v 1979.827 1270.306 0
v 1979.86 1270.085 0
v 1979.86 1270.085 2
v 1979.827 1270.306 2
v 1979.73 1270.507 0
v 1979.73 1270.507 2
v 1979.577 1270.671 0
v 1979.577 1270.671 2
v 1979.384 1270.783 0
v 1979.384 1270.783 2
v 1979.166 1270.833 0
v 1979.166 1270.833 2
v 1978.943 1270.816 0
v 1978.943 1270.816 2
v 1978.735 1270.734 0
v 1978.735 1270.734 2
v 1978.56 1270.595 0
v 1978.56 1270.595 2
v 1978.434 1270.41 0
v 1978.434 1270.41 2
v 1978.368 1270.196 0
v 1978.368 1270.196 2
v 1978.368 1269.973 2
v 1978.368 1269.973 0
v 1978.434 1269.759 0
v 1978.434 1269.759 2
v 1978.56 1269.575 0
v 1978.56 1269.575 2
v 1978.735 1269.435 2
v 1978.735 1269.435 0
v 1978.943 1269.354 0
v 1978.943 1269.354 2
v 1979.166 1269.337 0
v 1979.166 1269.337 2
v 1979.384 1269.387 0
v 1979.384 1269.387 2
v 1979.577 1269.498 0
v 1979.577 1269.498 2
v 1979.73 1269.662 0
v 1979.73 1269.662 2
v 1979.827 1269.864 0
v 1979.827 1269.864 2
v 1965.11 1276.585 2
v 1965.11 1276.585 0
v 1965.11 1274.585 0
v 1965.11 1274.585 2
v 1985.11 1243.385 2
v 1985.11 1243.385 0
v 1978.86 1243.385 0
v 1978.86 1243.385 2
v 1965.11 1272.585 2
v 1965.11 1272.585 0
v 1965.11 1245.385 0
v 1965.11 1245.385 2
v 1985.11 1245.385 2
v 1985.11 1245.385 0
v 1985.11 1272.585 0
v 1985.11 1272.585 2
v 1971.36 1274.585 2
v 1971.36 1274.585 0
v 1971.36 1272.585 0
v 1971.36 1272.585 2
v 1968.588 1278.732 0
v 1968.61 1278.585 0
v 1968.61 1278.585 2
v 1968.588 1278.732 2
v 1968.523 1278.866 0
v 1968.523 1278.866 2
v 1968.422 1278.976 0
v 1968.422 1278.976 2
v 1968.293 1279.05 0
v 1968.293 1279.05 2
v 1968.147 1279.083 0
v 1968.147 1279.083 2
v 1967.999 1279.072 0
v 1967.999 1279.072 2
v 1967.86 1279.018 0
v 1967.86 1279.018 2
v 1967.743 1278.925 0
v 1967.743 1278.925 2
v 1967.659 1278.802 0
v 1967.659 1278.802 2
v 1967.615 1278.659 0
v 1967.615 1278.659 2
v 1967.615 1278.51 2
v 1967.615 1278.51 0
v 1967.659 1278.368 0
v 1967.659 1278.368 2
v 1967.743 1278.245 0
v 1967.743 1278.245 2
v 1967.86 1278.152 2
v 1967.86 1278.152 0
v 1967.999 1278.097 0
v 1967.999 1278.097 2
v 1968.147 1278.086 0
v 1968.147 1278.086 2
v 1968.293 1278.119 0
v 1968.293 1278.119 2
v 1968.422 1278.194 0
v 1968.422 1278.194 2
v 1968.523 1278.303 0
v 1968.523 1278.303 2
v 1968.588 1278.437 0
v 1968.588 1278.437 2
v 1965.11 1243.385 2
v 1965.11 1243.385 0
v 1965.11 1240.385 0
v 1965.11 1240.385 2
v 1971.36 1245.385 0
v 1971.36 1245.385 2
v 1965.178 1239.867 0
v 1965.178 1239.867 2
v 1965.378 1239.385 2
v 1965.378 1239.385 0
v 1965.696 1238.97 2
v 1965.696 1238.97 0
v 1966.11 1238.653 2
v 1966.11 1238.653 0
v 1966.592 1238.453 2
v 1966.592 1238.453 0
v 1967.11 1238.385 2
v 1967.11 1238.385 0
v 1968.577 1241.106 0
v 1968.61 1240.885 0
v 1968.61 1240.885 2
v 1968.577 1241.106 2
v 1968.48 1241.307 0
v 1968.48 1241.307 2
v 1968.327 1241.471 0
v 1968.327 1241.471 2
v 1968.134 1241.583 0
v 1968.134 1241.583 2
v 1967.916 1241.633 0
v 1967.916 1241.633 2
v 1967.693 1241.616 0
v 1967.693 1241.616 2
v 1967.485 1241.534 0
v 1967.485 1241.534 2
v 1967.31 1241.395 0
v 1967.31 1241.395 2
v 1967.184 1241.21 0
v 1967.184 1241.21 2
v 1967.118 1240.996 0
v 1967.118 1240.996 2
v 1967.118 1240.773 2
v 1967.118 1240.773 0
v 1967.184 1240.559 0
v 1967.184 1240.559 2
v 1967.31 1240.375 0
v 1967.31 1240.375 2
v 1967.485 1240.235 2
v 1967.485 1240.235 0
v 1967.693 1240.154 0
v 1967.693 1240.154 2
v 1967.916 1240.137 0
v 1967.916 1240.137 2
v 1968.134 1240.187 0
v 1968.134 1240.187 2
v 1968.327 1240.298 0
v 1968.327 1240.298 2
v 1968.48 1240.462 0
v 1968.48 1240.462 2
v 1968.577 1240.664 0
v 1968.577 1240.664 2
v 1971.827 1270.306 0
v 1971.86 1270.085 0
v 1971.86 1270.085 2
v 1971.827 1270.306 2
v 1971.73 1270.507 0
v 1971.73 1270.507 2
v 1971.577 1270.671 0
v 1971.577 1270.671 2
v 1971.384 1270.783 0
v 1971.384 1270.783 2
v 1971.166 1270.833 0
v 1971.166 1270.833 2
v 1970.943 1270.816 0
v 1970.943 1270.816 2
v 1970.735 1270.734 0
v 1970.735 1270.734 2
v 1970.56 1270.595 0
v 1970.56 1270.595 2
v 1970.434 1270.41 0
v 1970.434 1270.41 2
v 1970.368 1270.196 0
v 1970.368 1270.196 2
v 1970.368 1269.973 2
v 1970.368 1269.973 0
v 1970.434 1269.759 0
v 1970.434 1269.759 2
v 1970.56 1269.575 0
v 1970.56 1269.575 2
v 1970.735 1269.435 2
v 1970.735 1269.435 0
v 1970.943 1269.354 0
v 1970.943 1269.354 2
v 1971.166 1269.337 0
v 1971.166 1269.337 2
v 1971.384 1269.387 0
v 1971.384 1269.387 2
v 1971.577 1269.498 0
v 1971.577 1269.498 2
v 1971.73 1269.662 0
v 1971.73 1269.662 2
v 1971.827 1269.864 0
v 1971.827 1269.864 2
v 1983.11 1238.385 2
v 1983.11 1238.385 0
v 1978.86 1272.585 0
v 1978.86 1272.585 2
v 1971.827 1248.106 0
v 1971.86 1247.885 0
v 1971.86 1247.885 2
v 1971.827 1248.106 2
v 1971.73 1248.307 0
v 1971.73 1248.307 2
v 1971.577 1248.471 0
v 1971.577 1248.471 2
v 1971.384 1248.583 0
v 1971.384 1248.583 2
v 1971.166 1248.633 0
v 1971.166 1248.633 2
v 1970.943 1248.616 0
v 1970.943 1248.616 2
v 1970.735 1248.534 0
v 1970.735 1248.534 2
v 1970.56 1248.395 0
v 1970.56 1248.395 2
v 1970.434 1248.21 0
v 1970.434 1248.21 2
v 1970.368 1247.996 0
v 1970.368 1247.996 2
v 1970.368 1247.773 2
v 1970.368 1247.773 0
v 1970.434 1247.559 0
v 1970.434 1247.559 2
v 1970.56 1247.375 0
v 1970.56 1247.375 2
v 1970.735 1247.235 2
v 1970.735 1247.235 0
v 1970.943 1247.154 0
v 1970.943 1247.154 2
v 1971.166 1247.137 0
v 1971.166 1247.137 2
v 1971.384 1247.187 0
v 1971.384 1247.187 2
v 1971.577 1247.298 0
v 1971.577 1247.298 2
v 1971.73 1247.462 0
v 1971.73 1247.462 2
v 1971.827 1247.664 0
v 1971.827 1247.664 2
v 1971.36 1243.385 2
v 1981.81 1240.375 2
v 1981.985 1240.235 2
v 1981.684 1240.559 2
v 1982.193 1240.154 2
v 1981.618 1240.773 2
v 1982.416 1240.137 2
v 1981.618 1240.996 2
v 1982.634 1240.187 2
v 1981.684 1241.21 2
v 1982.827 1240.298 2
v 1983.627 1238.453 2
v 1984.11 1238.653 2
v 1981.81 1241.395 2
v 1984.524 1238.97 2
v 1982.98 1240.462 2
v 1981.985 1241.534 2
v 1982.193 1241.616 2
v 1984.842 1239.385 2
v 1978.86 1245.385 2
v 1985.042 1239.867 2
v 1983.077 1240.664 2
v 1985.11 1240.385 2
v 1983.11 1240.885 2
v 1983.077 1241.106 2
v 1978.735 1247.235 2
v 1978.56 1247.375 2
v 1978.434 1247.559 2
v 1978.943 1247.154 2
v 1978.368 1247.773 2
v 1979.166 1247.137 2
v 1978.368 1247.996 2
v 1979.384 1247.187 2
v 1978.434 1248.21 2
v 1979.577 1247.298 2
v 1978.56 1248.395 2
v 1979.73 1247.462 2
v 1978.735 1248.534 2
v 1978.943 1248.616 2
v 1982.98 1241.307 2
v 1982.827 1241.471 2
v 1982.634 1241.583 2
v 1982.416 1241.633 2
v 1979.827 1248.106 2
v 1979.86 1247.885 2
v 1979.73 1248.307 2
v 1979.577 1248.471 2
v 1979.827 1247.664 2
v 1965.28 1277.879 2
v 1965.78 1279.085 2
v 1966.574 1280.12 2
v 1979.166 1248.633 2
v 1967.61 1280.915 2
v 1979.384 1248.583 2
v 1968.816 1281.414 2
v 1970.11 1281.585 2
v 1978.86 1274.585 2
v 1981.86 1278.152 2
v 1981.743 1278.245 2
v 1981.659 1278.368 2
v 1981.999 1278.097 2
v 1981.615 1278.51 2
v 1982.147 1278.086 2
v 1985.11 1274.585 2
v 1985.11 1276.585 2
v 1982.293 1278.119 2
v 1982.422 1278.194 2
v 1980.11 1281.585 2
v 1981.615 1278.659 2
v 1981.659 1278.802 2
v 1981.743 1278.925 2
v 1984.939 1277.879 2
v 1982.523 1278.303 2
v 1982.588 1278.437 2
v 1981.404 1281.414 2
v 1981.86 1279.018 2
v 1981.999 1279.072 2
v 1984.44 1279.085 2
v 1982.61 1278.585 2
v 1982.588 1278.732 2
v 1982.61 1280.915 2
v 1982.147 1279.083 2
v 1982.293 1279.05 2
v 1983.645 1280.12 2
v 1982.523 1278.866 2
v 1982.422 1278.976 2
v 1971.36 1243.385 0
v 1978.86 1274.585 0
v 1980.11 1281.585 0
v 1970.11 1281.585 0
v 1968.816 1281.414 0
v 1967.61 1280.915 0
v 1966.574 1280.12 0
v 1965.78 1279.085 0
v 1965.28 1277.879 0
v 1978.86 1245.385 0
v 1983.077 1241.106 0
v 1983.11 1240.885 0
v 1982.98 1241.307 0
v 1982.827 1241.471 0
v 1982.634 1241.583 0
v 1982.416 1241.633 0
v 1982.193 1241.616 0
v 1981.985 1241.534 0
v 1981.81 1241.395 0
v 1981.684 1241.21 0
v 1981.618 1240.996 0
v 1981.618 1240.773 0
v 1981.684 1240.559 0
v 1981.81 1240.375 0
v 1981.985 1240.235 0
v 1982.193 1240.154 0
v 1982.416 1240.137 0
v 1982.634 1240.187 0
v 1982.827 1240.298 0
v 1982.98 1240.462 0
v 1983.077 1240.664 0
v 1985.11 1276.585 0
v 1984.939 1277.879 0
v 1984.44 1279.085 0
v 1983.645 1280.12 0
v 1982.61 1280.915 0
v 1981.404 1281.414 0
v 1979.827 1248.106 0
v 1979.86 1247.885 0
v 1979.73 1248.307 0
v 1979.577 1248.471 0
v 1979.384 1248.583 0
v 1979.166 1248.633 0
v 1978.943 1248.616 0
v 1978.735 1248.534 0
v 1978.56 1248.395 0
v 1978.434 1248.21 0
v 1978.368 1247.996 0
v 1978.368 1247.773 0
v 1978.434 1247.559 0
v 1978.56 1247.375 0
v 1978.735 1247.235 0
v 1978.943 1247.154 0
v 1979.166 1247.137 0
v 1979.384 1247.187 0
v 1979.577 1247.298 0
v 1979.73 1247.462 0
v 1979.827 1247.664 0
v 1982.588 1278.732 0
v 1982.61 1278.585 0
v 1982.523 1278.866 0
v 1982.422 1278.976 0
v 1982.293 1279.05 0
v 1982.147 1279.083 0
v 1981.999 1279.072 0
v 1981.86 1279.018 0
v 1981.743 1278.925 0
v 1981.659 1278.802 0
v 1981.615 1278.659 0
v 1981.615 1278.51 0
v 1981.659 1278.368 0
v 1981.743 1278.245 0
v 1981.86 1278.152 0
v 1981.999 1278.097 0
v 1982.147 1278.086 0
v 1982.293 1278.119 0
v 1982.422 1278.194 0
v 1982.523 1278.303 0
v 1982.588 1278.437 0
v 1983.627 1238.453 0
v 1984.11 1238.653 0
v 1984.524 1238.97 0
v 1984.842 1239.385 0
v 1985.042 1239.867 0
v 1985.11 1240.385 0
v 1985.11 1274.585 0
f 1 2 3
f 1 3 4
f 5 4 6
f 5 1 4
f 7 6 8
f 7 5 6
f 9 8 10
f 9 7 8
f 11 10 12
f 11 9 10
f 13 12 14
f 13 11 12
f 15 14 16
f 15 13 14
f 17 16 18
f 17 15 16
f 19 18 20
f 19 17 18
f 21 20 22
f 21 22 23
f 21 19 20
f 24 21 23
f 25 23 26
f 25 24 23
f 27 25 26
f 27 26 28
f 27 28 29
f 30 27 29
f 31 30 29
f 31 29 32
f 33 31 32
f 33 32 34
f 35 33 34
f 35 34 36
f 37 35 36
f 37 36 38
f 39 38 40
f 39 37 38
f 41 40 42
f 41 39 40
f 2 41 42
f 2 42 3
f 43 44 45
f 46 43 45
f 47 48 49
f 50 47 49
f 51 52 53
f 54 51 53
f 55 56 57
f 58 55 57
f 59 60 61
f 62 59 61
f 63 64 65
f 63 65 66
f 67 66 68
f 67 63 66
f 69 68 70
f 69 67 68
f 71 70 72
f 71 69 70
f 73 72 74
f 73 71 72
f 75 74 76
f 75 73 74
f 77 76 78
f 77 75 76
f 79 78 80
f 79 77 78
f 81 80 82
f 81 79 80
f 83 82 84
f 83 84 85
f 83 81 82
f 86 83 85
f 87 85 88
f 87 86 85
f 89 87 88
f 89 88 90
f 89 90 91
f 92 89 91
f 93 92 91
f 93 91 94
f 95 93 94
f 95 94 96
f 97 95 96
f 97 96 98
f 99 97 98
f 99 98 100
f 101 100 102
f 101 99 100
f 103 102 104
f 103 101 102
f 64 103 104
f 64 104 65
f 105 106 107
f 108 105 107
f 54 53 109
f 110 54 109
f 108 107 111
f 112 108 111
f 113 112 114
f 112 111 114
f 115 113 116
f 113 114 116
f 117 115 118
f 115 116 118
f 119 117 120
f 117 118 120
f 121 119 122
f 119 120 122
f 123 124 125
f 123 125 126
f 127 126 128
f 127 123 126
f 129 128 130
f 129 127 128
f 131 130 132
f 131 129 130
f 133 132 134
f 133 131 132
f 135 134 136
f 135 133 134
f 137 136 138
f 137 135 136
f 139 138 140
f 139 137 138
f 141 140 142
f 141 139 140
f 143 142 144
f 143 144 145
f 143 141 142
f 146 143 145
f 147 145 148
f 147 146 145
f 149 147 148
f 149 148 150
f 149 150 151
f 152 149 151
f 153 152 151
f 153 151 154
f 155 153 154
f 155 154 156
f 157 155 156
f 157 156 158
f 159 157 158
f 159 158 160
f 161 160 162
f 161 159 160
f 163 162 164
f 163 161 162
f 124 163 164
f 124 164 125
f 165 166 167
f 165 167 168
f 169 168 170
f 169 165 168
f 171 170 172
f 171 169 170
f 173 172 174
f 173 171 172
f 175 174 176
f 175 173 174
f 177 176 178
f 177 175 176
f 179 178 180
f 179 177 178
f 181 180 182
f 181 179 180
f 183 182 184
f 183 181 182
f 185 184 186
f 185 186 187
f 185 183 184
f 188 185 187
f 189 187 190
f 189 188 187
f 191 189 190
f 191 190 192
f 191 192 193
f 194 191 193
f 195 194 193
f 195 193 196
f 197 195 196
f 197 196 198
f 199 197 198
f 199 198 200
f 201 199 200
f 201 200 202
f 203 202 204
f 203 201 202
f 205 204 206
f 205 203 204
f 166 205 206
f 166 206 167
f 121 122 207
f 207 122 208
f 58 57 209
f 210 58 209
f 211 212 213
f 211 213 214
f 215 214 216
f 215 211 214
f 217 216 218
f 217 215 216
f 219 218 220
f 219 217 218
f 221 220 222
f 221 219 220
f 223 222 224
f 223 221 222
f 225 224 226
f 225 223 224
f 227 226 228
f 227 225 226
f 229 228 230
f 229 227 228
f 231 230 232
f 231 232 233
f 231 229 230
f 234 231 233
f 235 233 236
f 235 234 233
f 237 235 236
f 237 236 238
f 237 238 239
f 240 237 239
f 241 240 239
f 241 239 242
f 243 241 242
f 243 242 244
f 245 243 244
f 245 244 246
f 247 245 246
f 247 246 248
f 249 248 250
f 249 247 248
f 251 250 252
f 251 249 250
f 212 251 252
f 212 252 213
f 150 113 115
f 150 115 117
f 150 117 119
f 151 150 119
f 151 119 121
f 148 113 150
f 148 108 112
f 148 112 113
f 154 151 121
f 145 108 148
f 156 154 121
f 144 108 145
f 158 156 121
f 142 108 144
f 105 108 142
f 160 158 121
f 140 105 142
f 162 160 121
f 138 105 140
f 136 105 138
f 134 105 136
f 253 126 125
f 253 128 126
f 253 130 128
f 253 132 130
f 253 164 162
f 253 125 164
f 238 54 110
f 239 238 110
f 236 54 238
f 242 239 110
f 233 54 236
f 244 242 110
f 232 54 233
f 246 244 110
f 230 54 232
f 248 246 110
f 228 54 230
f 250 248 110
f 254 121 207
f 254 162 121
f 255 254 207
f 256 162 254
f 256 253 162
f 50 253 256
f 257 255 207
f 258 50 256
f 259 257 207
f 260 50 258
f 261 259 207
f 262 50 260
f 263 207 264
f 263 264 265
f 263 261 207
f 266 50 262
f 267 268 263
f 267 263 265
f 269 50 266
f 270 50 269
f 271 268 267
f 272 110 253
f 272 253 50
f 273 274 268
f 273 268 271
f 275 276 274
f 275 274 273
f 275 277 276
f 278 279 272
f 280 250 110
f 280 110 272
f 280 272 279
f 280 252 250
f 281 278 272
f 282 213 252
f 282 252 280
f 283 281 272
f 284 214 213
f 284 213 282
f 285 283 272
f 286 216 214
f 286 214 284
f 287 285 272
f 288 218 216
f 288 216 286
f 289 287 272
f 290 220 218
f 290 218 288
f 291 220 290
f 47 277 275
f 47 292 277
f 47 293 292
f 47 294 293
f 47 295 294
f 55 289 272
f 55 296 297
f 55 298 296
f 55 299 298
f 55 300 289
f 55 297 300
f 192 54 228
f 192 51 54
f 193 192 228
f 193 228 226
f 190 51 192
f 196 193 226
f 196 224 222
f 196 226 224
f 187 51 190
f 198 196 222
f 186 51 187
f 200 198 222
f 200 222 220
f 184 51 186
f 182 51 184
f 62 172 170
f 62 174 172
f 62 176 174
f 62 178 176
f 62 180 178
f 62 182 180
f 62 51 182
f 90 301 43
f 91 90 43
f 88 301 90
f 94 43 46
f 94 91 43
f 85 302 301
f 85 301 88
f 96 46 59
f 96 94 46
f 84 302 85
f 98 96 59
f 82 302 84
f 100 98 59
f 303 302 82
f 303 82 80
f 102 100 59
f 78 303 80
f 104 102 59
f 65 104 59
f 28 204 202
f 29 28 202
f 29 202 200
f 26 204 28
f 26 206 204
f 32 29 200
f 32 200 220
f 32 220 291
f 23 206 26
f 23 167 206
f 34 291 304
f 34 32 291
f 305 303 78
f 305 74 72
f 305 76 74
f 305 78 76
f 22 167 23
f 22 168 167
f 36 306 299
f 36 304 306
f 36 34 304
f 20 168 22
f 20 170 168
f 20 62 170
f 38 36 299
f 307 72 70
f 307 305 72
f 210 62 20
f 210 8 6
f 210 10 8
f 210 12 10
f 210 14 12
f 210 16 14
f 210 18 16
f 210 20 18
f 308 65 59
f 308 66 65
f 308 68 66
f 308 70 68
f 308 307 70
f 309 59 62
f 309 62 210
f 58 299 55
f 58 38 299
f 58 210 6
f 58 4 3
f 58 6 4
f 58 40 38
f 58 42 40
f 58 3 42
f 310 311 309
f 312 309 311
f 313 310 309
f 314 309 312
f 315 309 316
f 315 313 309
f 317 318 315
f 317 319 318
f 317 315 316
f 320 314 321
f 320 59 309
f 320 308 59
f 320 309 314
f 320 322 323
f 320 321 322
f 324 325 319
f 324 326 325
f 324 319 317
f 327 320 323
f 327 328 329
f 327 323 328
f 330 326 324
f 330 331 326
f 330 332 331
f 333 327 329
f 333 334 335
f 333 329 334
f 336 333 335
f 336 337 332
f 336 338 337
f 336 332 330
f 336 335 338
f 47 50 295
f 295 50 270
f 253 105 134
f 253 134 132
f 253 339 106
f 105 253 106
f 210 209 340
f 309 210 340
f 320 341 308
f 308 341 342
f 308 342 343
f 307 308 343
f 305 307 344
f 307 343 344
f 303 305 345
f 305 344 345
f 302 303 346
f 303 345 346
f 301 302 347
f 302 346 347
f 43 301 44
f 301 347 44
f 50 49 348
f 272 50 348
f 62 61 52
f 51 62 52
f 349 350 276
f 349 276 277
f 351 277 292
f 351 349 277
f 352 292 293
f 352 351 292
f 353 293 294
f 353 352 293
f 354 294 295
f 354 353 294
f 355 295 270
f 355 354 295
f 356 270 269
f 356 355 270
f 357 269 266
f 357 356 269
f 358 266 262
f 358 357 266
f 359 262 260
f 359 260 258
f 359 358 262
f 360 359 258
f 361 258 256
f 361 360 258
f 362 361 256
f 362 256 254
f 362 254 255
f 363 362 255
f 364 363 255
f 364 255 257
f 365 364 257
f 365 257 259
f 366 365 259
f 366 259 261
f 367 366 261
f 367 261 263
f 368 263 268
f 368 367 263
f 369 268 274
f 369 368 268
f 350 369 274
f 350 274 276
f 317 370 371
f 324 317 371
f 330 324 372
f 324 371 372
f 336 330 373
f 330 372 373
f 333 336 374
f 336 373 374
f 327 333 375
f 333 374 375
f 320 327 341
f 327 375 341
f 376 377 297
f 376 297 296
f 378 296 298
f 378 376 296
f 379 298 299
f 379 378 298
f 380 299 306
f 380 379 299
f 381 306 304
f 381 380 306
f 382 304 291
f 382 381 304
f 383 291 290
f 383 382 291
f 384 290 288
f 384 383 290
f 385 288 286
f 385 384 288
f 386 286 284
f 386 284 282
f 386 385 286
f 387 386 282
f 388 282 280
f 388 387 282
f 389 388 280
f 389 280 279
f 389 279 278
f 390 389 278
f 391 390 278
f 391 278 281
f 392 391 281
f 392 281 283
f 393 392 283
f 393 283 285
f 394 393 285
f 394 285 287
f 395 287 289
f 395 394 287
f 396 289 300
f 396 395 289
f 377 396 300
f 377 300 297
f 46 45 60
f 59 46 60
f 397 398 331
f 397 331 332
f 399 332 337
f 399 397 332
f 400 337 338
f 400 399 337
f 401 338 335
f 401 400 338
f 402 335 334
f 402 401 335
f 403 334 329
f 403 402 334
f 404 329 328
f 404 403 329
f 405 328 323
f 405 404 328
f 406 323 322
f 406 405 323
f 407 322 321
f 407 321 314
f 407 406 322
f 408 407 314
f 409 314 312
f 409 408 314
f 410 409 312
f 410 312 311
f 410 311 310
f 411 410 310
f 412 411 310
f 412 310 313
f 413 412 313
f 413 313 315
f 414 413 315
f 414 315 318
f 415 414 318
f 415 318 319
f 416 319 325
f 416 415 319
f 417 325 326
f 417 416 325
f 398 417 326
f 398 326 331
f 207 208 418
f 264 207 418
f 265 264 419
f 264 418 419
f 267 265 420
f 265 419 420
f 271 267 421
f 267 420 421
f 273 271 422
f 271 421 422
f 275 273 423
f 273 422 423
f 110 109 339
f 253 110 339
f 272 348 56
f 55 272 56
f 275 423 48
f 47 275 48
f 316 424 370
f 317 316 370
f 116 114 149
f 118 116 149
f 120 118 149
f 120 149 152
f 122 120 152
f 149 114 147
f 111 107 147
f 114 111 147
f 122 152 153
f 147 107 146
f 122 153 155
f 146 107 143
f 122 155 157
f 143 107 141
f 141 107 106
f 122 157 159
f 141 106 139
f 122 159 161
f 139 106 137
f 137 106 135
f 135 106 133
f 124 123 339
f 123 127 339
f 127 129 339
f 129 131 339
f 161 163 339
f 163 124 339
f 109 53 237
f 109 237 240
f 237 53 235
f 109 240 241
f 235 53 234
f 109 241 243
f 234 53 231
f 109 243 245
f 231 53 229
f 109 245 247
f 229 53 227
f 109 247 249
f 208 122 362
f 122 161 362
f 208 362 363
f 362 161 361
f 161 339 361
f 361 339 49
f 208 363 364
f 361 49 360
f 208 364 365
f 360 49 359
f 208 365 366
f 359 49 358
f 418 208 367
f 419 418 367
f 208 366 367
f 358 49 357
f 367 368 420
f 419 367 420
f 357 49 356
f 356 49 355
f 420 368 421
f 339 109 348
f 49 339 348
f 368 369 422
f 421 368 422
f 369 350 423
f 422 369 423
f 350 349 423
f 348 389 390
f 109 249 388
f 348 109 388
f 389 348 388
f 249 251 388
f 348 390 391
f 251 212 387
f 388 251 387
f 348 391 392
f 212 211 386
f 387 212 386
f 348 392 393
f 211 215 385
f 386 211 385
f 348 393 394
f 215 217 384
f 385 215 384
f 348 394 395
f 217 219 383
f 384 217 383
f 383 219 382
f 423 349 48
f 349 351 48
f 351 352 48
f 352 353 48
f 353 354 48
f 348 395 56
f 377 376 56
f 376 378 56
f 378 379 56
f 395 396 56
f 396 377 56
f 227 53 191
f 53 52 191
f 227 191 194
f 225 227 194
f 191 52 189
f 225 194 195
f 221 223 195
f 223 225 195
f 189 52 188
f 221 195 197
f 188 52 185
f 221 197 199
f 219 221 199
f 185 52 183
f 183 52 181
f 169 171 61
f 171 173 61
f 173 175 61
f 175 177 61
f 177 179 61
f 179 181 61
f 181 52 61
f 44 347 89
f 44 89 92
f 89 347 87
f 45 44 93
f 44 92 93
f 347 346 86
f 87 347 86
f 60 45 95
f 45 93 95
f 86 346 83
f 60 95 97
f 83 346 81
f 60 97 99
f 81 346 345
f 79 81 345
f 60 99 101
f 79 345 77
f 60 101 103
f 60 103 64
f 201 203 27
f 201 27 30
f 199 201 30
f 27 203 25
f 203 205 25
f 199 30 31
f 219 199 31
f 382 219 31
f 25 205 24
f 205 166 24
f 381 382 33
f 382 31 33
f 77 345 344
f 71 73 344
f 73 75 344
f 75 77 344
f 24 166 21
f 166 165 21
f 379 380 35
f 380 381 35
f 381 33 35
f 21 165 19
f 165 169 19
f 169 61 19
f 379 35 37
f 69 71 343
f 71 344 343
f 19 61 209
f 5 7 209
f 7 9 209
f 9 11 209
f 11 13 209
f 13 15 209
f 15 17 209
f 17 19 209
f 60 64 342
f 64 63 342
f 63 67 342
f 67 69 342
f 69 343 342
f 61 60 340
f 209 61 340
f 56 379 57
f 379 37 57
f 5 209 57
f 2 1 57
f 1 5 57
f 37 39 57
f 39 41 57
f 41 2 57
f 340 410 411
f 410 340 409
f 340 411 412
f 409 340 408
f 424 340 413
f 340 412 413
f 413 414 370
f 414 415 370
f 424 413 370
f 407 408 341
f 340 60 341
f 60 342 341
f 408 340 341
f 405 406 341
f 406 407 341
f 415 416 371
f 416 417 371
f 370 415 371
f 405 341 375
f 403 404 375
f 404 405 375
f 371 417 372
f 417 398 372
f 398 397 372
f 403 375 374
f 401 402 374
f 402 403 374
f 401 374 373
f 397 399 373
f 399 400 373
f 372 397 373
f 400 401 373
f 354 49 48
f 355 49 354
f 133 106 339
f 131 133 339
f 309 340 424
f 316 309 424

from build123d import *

# Parameters (mm, degrees)
MODEL_R             = 0.5
MODEL_R_2           = 0.75
BOSS_EXTRUDE1_DEPTH = 2


with BuildPart() as part:
    # Model → Boss-Extrude1 (new body)
    with BuildSketch(Plane.XY):
        with BuildLine():
            Line((1967.109841287, 1238.384705077), (1983.109841287, 1238.384705077))
            ThreePointArc((1983.109841287, 1238.384705077), (1984.524054849, 1238.970491514), (1985.109841287, 1240.384705077))
            Line((1985.109841287, 1240.384705077), (1985.109841287, 1243.384705077))
            Line((1985.109841287, 1243.384705077), (1978.859841287, 1243.384705077))
            Line((1978.859841287, 1243.384705077), (1978.859841287, 1245.384705077))
            Line((1978.859841287, 1245.384705077), (1985.109841287, 1245.384705077))
            Line((1985.109841287, 1245.384705077), (1985.109841287, 1272.584705077))
            Line((1985.109841287, 1272.584705077), (1978.859841287, 1272.584705077))
            Line((1978.859841287, 1272.584705077), (1978.859841287, 1274.584705077))
            Line((1978.859841287, 1274.584705077), (1985.109841287, 1274.584705077))
            Line((1985.109841287, 1274.584705077), (1985.109841287, 1276.584705077))
            ThreePointArc((1985.109841287, 1276.584705077), (1983.645375192, 1280.120238983), (1980.109841287, 1281.584705077))
            Line((1980.109841287, 1281.584705077), (1970.109841287, 1281.584705077))
            ThreePointArc((1970.109841287, 1281.584705077), (1966.574307381, 1280.120238983), (1965.109841287, 1276.584705077))
            Line((1965.109841287, 1276.584705077), (1965.109841287, 1274.584705077))
            Line((1965.109841287, 1274.584705077), (1971.359841287, 1274.584705077))
            Line((1971.359841287, 1274.584705077), (1971.359841287, 1272.584705077))
            Line((1971.359841287, 1272.584705077), (1965.109841287, 1272.584705077))
            Line((1965.109841287, 1272.584705077), (1965.109841287, 1245.384705077))
            Line((1965.109841287, 1245.384705077), (1971.359841287, 1245.384705077))
            Line((1971.359841287, 1245.384705077), (1971.359841287, 1243.384705077))
            Line((1971.359841287, 1243.384705077), (1965.109841287, 1243.384705077))
            Line((1965.109841287, 1243.384705077), (1965.109841287, 1240.384705077))
            ThreePointArc((1965.109841287, 1240.384705077), (1965.695627724, 1238.970491514), (1967.109841287, 1238.384705077))
        make_face()
        with Locations((1968.109841287, 1278.584705077)):
            Circle(MODEL_R, mode=Mode.SUBTRACT)
        with Locations((1982.109841287, 1278.584705077)):
            Circle(MODEL_R, mode=Mode.SUBTRACT)
        with Locations((1979.109841287, 1247.884705077)):
            Circle(MODEL_R_2, mode=Mode.SUBTRACT)
        with Locations((1971.109841287, 1247.884705077)):
            Circle(MODEL_R_2, mode=Mode.SUBTRACT)
        with Locations((1979.109841287, 1270.084705077)):
            Circle(MODEL_R_2, mode=Mode.SUBTRACT)
        with Locations((1971.109841287, 1270.084705077)):
            Circle(MODEL_R_2, mode=Mode.SUBTRACT)
        with Locations((1982.359841287, 1240.884705077)):
            Circle(MODEL_R_2, mode=Mode.SUBTRACT)
        with Locations((1967.859841287, 1240.884705077)):
            Circle(MODEL_R_2, mode=Mode.SUBTRACT)
    extrude(amount=BOSS_EXTRUDE1_DEPTH)


solid = part.part
